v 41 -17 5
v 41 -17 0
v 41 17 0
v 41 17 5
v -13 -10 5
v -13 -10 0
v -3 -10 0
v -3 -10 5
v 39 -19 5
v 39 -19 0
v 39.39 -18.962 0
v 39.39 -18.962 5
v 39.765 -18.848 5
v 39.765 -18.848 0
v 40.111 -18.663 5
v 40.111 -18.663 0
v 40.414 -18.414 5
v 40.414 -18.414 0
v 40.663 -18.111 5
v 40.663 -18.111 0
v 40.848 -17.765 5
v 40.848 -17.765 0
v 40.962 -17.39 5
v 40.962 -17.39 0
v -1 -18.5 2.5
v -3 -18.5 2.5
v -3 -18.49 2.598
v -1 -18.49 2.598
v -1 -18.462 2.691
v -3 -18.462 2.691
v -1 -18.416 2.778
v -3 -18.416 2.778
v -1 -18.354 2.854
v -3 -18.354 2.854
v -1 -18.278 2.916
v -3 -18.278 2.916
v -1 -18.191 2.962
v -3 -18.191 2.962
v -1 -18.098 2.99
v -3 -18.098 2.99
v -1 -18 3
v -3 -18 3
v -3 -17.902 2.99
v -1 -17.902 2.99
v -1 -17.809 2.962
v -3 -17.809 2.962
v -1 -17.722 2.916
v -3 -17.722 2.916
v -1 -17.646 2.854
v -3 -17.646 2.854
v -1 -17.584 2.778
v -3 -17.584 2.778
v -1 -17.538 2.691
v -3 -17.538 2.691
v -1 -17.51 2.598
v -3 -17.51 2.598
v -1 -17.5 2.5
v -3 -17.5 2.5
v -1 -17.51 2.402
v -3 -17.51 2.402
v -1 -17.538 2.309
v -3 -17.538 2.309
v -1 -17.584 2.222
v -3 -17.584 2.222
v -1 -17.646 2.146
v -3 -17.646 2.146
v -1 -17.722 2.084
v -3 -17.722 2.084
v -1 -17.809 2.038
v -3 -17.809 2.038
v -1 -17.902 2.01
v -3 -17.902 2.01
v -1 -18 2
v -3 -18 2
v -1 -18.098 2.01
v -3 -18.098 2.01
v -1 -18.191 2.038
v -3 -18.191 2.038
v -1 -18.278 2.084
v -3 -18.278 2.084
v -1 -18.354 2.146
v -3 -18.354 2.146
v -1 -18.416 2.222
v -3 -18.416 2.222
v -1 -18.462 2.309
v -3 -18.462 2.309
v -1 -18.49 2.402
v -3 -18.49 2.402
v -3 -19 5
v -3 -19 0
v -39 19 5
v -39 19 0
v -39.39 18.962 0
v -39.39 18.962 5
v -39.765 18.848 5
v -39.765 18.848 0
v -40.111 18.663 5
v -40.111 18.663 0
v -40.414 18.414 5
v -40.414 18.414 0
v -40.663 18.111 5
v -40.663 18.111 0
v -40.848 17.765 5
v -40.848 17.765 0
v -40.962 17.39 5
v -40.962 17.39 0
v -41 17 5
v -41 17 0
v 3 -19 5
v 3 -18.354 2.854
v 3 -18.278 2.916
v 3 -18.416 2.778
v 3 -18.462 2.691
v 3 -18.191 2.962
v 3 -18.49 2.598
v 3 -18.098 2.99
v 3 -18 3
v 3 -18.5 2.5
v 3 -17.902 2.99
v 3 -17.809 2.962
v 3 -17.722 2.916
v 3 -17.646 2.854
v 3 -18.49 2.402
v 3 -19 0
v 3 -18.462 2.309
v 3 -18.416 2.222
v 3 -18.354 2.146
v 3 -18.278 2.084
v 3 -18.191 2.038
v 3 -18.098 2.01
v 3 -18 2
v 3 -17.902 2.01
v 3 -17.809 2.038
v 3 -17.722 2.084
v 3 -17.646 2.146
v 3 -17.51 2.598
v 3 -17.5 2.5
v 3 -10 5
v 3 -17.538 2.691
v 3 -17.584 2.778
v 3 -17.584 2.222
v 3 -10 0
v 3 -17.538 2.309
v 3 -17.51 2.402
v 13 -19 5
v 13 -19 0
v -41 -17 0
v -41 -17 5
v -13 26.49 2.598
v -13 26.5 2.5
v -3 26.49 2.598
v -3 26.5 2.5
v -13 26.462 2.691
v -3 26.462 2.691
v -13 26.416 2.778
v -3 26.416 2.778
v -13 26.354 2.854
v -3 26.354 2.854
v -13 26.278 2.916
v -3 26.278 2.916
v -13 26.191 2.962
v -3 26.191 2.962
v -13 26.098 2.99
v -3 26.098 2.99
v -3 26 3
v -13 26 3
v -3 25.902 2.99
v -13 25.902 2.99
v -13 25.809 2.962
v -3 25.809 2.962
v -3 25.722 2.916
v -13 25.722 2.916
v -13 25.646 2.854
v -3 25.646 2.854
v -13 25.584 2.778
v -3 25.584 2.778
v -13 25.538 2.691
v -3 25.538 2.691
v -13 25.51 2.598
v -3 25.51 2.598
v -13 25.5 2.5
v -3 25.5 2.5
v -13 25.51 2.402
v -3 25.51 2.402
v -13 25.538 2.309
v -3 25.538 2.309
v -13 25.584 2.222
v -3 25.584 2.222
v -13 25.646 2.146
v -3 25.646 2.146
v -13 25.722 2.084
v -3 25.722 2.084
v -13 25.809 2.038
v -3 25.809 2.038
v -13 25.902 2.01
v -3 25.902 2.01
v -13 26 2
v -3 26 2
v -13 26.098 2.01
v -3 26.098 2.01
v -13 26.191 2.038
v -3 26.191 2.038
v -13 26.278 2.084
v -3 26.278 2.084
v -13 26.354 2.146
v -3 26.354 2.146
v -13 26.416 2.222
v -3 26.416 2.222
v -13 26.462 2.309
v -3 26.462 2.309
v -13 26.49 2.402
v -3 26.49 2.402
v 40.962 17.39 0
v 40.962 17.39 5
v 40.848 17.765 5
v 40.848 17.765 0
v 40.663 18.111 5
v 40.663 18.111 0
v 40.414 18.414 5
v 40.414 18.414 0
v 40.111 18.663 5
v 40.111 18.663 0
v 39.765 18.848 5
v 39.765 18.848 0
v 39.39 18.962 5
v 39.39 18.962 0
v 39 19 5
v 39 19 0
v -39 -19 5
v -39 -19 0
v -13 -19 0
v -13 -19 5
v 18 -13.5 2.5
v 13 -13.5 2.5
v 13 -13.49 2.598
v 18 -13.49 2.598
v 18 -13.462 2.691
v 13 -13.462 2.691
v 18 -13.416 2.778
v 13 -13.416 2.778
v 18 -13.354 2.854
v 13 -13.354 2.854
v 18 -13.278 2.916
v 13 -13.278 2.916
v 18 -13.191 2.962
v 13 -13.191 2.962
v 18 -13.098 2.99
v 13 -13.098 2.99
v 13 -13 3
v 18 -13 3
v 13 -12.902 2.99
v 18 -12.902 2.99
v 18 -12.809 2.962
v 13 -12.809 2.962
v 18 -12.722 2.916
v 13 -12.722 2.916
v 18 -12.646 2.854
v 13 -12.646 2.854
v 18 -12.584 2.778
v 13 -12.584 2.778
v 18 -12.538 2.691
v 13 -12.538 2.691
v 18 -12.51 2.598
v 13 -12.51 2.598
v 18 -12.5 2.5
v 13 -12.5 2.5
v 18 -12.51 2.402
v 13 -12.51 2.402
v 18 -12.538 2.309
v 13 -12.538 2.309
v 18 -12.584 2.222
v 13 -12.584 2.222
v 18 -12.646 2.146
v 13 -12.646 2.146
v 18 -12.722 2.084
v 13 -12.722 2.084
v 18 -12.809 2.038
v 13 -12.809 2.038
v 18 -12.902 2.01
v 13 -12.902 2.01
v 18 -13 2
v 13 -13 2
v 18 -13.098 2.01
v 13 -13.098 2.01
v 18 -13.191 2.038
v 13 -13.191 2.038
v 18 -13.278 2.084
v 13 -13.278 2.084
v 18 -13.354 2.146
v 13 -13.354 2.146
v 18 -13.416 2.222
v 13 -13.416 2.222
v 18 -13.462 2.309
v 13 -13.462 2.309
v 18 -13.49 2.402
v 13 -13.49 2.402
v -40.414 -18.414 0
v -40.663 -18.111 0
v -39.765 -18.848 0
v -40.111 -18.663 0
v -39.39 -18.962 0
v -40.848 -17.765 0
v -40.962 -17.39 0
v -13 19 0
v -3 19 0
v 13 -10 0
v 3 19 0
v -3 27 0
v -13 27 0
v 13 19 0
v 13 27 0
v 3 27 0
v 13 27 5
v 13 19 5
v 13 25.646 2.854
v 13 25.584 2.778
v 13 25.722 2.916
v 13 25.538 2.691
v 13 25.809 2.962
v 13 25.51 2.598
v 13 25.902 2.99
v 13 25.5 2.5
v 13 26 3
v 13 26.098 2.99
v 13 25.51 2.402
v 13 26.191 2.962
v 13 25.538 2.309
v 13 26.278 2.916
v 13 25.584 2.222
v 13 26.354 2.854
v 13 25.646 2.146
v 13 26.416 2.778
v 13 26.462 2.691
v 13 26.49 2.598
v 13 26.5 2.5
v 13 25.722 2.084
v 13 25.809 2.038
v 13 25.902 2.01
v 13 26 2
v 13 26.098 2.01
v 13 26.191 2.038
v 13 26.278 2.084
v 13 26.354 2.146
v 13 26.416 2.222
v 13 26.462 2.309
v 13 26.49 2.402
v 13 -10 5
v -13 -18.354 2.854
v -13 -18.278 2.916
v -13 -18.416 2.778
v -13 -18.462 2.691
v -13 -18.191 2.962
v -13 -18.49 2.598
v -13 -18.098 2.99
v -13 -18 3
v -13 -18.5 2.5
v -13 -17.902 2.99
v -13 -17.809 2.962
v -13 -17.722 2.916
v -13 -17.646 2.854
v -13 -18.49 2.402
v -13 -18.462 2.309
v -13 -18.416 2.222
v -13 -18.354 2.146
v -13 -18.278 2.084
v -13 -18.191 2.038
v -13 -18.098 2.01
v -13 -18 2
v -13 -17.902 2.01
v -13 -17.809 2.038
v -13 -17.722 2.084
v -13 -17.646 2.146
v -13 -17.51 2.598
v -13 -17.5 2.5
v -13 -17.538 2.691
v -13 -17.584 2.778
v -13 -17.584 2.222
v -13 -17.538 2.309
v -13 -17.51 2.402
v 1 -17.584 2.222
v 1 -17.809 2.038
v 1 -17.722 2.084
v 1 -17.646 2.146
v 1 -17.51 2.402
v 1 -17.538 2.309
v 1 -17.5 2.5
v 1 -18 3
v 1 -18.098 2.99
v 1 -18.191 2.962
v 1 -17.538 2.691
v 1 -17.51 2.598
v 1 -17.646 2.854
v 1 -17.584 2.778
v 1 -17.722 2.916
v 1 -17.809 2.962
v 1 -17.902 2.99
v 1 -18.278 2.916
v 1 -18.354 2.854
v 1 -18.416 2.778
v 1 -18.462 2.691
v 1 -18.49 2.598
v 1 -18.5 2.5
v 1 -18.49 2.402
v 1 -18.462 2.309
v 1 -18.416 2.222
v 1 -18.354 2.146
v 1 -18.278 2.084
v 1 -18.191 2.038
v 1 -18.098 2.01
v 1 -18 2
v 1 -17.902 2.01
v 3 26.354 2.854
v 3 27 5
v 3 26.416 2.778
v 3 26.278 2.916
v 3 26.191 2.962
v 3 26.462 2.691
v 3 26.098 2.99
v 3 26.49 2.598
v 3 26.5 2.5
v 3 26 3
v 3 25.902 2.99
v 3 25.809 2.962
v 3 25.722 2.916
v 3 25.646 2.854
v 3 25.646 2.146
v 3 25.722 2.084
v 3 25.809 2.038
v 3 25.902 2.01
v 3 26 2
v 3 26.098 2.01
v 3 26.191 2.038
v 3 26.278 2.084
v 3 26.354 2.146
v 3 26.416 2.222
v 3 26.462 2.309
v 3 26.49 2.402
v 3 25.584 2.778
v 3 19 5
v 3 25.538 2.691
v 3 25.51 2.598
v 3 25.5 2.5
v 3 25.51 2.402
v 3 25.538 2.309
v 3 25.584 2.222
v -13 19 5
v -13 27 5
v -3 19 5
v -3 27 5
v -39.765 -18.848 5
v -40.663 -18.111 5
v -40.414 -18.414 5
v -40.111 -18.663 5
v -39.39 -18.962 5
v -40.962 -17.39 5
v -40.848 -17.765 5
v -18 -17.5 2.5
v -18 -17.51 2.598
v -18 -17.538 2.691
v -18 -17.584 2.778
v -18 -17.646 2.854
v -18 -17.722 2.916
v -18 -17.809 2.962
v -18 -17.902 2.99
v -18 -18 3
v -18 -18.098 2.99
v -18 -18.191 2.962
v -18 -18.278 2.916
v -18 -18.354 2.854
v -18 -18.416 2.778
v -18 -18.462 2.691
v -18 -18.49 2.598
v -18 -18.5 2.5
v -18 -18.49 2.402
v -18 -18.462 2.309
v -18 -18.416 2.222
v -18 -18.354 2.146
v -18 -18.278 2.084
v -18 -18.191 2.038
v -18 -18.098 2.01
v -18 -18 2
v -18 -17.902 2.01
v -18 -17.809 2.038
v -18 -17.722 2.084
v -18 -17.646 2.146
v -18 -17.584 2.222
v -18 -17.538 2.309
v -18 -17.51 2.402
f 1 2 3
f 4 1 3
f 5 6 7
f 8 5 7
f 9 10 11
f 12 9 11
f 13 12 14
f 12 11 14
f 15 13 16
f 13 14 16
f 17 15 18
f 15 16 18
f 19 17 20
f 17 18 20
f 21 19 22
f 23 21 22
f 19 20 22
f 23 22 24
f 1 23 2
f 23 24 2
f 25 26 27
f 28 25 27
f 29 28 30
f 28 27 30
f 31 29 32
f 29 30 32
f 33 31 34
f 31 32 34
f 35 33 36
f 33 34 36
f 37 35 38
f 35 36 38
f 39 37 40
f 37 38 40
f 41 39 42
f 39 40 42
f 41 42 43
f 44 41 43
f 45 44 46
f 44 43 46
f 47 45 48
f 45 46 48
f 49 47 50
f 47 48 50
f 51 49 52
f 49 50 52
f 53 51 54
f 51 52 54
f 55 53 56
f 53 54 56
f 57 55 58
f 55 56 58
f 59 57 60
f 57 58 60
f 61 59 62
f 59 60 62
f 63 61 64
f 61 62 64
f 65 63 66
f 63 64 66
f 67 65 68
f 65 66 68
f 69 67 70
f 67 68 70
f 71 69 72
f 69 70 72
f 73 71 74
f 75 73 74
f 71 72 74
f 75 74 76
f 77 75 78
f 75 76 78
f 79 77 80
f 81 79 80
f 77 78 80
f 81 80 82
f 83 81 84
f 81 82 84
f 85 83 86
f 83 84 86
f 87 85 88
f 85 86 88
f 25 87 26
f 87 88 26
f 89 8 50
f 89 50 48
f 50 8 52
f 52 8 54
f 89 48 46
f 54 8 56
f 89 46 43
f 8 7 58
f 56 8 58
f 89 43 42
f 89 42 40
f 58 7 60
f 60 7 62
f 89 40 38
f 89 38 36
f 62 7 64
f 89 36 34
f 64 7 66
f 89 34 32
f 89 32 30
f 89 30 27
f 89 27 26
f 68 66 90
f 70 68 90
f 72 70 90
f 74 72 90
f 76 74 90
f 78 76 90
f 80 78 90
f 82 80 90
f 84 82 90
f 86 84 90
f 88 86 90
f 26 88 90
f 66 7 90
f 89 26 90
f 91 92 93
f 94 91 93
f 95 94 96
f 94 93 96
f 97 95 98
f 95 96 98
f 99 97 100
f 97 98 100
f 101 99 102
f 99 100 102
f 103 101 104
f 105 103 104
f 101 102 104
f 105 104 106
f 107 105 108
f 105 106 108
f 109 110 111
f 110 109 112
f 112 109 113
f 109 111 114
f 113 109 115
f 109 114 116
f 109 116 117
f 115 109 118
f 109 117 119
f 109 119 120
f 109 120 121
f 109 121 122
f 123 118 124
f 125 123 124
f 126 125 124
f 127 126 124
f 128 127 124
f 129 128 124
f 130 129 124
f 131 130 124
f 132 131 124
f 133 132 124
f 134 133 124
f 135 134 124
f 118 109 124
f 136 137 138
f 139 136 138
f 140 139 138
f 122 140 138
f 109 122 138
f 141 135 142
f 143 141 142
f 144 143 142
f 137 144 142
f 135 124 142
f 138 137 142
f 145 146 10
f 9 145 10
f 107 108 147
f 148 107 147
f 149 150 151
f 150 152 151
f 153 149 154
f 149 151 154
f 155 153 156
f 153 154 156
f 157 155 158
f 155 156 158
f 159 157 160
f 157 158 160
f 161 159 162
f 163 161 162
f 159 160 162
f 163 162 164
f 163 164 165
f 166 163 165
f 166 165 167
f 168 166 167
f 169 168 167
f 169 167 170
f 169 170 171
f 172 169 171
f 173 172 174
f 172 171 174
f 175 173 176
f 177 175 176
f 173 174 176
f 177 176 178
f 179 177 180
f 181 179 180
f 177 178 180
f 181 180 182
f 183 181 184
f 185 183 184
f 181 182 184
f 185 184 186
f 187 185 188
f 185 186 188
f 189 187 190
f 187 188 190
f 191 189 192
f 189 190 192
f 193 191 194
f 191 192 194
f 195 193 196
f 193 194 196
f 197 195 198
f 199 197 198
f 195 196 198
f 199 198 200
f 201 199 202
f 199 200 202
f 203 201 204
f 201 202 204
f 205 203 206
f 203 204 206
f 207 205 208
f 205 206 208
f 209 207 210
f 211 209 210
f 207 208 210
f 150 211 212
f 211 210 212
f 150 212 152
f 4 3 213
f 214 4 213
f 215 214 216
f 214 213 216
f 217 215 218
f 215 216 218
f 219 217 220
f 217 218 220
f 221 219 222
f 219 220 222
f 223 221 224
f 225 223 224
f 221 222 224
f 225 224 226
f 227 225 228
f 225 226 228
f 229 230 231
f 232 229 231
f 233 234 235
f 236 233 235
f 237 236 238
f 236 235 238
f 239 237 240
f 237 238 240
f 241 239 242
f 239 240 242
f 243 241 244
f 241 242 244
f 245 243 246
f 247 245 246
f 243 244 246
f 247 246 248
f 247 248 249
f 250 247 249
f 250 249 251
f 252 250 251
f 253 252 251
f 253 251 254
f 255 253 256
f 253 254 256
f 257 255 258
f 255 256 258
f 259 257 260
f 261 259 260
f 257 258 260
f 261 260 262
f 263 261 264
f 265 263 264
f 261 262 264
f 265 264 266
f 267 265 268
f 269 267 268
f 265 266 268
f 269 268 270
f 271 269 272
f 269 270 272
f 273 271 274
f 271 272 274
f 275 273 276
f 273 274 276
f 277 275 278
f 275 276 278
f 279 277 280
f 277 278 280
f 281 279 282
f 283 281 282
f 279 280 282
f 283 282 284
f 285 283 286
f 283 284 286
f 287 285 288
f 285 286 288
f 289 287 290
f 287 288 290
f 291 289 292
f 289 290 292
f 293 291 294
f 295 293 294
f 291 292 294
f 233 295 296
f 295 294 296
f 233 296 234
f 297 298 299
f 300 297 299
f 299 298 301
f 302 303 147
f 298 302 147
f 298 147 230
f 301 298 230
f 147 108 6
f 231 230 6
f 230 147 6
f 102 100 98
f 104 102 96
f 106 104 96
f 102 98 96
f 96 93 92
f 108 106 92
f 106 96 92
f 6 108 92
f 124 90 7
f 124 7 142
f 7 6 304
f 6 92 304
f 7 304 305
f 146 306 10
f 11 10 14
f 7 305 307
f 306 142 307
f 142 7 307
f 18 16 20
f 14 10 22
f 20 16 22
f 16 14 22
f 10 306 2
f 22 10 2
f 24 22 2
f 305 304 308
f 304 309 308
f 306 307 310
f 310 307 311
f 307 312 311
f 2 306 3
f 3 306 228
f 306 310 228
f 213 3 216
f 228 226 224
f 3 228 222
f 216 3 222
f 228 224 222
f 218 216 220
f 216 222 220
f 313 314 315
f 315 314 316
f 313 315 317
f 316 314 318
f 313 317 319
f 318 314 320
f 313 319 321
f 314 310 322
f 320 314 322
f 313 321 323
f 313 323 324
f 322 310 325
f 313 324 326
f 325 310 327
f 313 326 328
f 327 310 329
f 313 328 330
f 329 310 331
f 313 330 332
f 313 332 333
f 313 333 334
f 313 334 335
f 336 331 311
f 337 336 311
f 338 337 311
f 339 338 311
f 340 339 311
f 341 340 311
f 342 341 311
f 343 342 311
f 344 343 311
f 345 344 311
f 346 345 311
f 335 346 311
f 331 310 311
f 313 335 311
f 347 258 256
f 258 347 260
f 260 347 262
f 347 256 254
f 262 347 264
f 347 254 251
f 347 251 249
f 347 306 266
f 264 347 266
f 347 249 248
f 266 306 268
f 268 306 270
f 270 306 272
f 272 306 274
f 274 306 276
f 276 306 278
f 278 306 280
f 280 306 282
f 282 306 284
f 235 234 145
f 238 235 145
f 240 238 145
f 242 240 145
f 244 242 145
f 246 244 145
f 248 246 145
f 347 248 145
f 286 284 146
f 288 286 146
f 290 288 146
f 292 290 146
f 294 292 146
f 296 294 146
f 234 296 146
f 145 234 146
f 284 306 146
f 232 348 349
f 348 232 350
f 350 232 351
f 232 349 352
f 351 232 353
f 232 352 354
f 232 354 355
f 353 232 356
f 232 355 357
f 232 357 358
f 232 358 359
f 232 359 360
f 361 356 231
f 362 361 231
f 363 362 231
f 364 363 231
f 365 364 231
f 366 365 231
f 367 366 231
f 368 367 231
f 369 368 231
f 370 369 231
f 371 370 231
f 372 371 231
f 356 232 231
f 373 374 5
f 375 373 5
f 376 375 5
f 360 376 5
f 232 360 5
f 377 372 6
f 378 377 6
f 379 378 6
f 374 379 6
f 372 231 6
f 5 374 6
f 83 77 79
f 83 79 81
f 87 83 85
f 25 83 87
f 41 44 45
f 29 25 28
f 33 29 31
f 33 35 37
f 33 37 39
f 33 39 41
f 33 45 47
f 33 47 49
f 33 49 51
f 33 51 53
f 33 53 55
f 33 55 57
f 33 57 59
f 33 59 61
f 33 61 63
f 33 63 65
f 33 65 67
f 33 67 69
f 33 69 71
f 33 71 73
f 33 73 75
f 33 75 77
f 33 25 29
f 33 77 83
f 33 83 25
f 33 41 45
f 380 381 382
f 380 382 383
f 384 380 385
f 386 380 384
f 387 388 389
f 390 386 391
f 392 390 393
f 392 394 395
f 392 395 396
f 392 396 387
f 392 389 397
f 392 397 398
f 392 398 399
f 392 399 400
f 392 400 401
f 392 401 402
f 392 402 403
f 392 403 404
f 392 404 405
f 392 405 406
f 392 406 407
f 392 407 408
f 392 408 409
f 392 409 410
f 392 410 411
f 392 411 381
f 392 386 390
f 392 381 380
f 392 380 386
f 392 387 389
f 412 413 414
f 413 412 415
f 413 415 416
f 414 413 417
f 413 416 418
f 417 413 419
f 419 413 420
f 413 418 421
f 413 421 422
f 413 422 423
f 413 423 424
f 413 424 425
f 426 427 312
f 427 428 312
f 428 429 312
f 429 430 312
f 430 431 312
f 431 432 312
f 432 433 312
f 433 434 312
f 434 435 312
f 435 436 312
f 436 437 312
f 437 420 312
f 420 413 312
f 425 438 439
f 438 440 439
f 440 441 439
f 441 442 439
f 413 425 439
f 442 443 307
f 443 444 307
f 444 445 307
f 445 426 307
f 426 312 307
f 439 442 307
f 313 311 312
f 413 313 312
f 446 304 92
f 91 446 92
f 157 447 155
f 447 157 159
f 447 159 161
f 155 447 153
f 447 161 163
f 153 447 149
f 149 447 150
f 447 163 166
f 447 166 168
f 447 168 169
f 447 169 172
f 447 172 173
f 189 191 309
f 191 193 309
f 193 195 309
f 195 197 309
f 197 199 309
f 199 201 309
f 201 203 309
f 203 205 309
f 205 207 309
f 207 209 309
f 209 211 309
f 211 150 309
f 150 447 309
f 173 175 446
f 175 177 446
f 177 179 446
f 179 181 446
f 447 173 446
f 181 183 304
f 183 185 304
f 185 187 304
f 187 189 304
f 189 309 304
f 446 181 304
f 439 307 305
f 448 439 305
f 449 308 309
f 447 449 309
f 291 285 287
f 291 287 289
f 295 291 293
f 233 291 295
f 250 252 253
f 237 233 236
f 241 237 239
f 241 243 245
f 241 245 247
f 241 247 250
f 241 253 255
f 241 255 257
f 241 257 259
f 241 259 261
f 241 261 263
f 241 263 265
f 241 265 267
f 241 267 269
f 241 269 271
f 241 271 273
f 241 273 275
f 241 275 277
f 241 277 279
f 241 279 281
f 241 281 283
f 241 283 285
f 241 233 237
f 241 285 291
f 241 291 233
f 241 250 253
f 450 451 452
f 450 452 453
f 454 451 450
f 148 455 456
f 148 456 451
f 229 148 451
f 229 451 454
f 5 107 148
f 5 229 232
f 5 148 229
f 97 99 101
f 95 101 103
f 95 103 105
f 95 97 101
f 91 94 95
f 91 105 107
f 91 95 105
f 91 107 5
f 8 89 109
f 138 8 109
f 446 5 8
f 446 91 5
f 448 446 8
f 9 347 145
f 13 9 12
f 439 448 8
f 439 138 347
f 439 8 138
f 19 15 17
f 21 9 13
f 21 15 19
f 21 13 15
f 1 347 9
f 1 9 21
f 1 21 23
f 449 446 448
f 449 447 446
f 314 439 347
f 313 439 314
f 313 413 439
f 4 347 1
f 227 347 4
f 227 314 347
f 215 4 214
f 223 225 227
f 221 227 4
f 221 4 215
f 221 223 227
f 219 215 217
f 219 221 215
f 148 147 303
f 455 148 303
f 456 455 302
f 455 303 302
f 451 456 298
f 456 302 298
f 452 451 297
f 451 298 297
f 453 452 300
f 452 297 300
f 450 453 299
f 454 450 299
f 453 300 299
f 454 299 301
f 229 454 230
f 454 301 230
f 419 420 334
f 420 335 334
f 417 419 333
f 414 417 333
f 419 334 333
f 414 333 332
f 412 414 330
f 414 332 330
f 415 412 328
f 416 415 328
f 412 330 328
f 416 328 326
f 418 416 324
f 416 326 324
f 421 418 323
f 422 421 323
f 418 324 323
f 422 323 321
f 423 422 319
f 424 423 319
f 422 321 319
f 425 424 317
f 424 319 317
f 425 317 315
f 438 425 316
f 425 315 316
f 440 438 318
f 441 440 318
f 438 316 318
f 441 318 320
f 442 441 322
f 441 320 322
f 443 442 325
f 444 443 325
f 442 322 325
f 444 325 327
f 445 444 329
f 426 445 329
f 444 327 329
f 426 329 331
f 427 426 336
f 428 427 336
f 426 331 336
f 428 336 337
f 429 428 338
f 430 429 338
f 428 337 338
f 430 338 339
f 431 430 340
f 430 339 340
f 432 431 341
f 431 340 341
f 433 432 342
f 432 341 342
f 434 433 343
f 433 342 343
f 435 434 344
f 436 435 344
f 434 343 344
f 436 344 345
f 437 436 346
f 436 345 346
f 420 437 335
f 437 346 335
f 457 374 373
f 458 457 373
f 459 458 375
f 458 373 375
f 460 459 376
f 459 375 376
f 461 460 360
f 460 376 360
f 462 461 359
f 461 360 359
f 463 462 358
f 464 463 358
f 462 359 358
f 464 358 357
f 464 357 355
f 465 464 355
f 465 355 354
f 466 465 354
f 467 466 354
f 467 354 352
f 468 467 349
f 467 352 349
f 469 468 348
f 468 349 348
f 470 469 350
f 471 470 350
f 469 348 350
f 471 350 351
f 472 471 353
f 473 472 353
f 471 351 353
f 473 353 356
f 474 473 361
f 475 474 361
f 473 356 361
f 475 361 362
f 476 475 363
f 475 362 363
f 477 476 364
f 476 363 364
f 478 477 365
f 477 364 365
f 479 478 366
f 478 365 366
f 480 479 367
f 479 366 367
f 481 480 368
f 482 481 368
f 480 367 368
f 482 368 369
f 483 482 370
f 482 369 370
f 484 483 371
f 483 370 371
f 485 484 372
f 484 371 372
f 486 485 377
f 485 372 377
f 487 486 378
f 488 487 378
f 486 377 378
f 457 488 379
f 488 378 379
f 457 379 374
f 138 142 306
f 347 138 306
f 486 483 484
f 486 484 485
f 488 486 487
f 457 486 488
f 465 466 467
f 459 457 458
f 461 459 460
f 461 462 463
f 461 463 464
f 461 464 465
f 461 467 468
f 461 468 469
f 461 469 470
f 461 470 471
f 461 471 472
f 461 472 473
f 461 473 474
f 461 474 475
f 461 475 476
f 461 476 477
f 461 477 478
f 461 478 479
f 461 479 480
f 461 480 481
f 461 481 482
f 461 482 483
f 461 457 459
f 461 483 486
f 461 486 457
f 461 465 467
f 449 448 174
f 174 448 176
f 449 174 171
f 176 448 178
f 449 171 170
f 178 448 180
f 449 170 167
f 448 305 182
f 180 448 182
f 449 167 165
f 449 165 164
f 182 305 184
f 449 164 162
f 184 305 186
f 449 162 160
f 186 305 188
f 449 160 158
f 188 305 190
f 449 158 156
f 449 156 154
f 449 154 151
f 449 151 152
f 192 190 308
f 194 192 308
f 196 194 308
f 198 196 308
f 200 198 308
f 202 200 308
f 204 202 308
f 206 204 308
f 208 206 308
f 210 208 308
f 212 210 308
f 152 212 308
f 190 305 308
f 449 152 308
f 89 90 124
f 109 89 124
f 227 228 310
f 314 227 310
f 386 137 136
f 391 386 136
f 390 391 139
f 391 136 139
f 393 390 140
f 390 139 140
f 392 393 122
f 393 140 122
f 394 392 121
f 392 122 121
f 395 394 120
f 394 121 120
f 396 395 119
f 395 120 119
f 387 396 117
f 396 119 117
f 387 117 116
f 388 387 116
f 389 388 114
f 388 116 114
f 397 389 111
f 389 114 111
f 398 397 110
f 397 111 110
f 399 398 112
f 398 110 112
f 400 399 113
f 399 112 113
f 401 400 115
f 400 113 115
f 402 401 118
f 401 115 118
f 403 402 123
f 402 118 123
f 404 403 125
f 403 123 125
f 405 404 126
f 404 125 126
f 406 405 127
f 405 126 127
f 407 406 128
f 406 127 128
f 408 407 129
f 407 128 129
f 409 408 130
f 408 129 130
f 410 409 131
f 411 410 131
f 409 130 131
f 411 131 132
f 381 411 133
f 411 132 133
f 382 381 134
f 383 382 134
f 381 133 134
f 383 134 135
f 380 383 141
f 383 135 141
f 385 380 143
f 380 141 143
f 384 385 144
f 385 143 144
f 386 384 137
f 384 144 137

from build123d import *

# Parameters (mm, degrees)
F1_DEPTH  = 5
F2_R      = 0.5
F3_DEPTH  = 2
F4_R      = 0.5
F5_DEPTH  = 5
F6_R      = 0.5
F7_DEPTH  = 2
F8_R      = 0.5
F9_DEPTH  = 5
F10_R     = 0.5
F11_DEPTH = 14.478


with BuildPart() as f1:
    # F0 (on Top) → F1 (new body)
    with BuildSketch(Plane.XY):
        with BuildLine():
            ThreePointArc((-39, 19), (-40.4142135624, 18.4142135624), (-41, 17))
            Line((-41, 17), (-41, -17))
            ThreePointArc((-41, -17), (-40.4142135624, -18.4142135624), (-39, -19))
            Line((-39, -19), (-13, -19))
            Line((-13, -19), (-13, -10))
            Line((-13, -10), (-3, -10))
            Line((-3, -10), (-3, -19))
            Line((-3, -19), (3, -19))
            Line((3, -19), (3, -10))
            Line((3, -10), (13, -10))
            Line((13, -10), (13, -19))
            Line((13, -19), (39, -19))
            ThreePointArc((39, -19), (40.4142135624, -18.4142135624), (41, -17))
            Line((41, -17), (41, 17))
            ThreePointArc((41, 17), (40.4142135624, 18.4142135624), (39, 19))
            Line((39, 19), (13, 19))
            Line((13, 19), (13, 27))
            Line((13, 27), (3, 27))
            Line((3, 27), (3, 19))
            Line((3, 19), (-3, 19))
            Line((-3, 19), (-3, 27))
            Line((-3, 27), (-13, 27))
            Line((-13, 27), (-13, 19))
            Line((-13, 19), (-39, 19))
        make_face()
    extrude(amount=F1_DEPTH)

    # F2 (on face) → F3 (cut)
    with BuildSketch(Plane.YZ.offset(3)):
        with Locations((-18, 2.5)):
            Circle(F2_R)
    extrude(amount=-F3_DEPTH, mode=Mode.SUBTRACT)

    # F4 (on face) → F5 (cut)
    with BuildSketch(Plane(origin=(13, 0, 0), x_dir=(0, -1, 0), z_dir=(-1, 0, 0))):
        with Locations((13, 2.5)):
            Circle(F4_R)
    extrude(amount=-F5_DEPTH, mode=Mode.SUBTRACT)

    # F6 (on face) → F7 (cut)
    with BuildSketch(Plane(origin=(-3, 0, 0), x_dir=(0, -1, 0), z_dir=(-1, 0, 0))):
        with Locations((18, 2.5)):
            Circle(F6_R)
    extrude(amount=-F7_DEPTH, mode=Mode.SUBTRACT)

    # F8 (on face) → F9 (cut)
    with BuildSketch(Plane.YZ.offset(-13)):
        with Locations((-18, 2.5)):
            Circle(F8_R)
    extrude(amount=-F9_DEPTH, mode=Mode.SUBTRACT)

    # F10 (on Right) → F11 (cut, symmetric)
    with BuildSketch(Plane.YZ):
        with Locations((26, 2.5)):
            Circle(F10_R)
    extrude(amount=F11_DEPTH, both=True, mode=Mode.SUBTRACT)


solid = f1.part
